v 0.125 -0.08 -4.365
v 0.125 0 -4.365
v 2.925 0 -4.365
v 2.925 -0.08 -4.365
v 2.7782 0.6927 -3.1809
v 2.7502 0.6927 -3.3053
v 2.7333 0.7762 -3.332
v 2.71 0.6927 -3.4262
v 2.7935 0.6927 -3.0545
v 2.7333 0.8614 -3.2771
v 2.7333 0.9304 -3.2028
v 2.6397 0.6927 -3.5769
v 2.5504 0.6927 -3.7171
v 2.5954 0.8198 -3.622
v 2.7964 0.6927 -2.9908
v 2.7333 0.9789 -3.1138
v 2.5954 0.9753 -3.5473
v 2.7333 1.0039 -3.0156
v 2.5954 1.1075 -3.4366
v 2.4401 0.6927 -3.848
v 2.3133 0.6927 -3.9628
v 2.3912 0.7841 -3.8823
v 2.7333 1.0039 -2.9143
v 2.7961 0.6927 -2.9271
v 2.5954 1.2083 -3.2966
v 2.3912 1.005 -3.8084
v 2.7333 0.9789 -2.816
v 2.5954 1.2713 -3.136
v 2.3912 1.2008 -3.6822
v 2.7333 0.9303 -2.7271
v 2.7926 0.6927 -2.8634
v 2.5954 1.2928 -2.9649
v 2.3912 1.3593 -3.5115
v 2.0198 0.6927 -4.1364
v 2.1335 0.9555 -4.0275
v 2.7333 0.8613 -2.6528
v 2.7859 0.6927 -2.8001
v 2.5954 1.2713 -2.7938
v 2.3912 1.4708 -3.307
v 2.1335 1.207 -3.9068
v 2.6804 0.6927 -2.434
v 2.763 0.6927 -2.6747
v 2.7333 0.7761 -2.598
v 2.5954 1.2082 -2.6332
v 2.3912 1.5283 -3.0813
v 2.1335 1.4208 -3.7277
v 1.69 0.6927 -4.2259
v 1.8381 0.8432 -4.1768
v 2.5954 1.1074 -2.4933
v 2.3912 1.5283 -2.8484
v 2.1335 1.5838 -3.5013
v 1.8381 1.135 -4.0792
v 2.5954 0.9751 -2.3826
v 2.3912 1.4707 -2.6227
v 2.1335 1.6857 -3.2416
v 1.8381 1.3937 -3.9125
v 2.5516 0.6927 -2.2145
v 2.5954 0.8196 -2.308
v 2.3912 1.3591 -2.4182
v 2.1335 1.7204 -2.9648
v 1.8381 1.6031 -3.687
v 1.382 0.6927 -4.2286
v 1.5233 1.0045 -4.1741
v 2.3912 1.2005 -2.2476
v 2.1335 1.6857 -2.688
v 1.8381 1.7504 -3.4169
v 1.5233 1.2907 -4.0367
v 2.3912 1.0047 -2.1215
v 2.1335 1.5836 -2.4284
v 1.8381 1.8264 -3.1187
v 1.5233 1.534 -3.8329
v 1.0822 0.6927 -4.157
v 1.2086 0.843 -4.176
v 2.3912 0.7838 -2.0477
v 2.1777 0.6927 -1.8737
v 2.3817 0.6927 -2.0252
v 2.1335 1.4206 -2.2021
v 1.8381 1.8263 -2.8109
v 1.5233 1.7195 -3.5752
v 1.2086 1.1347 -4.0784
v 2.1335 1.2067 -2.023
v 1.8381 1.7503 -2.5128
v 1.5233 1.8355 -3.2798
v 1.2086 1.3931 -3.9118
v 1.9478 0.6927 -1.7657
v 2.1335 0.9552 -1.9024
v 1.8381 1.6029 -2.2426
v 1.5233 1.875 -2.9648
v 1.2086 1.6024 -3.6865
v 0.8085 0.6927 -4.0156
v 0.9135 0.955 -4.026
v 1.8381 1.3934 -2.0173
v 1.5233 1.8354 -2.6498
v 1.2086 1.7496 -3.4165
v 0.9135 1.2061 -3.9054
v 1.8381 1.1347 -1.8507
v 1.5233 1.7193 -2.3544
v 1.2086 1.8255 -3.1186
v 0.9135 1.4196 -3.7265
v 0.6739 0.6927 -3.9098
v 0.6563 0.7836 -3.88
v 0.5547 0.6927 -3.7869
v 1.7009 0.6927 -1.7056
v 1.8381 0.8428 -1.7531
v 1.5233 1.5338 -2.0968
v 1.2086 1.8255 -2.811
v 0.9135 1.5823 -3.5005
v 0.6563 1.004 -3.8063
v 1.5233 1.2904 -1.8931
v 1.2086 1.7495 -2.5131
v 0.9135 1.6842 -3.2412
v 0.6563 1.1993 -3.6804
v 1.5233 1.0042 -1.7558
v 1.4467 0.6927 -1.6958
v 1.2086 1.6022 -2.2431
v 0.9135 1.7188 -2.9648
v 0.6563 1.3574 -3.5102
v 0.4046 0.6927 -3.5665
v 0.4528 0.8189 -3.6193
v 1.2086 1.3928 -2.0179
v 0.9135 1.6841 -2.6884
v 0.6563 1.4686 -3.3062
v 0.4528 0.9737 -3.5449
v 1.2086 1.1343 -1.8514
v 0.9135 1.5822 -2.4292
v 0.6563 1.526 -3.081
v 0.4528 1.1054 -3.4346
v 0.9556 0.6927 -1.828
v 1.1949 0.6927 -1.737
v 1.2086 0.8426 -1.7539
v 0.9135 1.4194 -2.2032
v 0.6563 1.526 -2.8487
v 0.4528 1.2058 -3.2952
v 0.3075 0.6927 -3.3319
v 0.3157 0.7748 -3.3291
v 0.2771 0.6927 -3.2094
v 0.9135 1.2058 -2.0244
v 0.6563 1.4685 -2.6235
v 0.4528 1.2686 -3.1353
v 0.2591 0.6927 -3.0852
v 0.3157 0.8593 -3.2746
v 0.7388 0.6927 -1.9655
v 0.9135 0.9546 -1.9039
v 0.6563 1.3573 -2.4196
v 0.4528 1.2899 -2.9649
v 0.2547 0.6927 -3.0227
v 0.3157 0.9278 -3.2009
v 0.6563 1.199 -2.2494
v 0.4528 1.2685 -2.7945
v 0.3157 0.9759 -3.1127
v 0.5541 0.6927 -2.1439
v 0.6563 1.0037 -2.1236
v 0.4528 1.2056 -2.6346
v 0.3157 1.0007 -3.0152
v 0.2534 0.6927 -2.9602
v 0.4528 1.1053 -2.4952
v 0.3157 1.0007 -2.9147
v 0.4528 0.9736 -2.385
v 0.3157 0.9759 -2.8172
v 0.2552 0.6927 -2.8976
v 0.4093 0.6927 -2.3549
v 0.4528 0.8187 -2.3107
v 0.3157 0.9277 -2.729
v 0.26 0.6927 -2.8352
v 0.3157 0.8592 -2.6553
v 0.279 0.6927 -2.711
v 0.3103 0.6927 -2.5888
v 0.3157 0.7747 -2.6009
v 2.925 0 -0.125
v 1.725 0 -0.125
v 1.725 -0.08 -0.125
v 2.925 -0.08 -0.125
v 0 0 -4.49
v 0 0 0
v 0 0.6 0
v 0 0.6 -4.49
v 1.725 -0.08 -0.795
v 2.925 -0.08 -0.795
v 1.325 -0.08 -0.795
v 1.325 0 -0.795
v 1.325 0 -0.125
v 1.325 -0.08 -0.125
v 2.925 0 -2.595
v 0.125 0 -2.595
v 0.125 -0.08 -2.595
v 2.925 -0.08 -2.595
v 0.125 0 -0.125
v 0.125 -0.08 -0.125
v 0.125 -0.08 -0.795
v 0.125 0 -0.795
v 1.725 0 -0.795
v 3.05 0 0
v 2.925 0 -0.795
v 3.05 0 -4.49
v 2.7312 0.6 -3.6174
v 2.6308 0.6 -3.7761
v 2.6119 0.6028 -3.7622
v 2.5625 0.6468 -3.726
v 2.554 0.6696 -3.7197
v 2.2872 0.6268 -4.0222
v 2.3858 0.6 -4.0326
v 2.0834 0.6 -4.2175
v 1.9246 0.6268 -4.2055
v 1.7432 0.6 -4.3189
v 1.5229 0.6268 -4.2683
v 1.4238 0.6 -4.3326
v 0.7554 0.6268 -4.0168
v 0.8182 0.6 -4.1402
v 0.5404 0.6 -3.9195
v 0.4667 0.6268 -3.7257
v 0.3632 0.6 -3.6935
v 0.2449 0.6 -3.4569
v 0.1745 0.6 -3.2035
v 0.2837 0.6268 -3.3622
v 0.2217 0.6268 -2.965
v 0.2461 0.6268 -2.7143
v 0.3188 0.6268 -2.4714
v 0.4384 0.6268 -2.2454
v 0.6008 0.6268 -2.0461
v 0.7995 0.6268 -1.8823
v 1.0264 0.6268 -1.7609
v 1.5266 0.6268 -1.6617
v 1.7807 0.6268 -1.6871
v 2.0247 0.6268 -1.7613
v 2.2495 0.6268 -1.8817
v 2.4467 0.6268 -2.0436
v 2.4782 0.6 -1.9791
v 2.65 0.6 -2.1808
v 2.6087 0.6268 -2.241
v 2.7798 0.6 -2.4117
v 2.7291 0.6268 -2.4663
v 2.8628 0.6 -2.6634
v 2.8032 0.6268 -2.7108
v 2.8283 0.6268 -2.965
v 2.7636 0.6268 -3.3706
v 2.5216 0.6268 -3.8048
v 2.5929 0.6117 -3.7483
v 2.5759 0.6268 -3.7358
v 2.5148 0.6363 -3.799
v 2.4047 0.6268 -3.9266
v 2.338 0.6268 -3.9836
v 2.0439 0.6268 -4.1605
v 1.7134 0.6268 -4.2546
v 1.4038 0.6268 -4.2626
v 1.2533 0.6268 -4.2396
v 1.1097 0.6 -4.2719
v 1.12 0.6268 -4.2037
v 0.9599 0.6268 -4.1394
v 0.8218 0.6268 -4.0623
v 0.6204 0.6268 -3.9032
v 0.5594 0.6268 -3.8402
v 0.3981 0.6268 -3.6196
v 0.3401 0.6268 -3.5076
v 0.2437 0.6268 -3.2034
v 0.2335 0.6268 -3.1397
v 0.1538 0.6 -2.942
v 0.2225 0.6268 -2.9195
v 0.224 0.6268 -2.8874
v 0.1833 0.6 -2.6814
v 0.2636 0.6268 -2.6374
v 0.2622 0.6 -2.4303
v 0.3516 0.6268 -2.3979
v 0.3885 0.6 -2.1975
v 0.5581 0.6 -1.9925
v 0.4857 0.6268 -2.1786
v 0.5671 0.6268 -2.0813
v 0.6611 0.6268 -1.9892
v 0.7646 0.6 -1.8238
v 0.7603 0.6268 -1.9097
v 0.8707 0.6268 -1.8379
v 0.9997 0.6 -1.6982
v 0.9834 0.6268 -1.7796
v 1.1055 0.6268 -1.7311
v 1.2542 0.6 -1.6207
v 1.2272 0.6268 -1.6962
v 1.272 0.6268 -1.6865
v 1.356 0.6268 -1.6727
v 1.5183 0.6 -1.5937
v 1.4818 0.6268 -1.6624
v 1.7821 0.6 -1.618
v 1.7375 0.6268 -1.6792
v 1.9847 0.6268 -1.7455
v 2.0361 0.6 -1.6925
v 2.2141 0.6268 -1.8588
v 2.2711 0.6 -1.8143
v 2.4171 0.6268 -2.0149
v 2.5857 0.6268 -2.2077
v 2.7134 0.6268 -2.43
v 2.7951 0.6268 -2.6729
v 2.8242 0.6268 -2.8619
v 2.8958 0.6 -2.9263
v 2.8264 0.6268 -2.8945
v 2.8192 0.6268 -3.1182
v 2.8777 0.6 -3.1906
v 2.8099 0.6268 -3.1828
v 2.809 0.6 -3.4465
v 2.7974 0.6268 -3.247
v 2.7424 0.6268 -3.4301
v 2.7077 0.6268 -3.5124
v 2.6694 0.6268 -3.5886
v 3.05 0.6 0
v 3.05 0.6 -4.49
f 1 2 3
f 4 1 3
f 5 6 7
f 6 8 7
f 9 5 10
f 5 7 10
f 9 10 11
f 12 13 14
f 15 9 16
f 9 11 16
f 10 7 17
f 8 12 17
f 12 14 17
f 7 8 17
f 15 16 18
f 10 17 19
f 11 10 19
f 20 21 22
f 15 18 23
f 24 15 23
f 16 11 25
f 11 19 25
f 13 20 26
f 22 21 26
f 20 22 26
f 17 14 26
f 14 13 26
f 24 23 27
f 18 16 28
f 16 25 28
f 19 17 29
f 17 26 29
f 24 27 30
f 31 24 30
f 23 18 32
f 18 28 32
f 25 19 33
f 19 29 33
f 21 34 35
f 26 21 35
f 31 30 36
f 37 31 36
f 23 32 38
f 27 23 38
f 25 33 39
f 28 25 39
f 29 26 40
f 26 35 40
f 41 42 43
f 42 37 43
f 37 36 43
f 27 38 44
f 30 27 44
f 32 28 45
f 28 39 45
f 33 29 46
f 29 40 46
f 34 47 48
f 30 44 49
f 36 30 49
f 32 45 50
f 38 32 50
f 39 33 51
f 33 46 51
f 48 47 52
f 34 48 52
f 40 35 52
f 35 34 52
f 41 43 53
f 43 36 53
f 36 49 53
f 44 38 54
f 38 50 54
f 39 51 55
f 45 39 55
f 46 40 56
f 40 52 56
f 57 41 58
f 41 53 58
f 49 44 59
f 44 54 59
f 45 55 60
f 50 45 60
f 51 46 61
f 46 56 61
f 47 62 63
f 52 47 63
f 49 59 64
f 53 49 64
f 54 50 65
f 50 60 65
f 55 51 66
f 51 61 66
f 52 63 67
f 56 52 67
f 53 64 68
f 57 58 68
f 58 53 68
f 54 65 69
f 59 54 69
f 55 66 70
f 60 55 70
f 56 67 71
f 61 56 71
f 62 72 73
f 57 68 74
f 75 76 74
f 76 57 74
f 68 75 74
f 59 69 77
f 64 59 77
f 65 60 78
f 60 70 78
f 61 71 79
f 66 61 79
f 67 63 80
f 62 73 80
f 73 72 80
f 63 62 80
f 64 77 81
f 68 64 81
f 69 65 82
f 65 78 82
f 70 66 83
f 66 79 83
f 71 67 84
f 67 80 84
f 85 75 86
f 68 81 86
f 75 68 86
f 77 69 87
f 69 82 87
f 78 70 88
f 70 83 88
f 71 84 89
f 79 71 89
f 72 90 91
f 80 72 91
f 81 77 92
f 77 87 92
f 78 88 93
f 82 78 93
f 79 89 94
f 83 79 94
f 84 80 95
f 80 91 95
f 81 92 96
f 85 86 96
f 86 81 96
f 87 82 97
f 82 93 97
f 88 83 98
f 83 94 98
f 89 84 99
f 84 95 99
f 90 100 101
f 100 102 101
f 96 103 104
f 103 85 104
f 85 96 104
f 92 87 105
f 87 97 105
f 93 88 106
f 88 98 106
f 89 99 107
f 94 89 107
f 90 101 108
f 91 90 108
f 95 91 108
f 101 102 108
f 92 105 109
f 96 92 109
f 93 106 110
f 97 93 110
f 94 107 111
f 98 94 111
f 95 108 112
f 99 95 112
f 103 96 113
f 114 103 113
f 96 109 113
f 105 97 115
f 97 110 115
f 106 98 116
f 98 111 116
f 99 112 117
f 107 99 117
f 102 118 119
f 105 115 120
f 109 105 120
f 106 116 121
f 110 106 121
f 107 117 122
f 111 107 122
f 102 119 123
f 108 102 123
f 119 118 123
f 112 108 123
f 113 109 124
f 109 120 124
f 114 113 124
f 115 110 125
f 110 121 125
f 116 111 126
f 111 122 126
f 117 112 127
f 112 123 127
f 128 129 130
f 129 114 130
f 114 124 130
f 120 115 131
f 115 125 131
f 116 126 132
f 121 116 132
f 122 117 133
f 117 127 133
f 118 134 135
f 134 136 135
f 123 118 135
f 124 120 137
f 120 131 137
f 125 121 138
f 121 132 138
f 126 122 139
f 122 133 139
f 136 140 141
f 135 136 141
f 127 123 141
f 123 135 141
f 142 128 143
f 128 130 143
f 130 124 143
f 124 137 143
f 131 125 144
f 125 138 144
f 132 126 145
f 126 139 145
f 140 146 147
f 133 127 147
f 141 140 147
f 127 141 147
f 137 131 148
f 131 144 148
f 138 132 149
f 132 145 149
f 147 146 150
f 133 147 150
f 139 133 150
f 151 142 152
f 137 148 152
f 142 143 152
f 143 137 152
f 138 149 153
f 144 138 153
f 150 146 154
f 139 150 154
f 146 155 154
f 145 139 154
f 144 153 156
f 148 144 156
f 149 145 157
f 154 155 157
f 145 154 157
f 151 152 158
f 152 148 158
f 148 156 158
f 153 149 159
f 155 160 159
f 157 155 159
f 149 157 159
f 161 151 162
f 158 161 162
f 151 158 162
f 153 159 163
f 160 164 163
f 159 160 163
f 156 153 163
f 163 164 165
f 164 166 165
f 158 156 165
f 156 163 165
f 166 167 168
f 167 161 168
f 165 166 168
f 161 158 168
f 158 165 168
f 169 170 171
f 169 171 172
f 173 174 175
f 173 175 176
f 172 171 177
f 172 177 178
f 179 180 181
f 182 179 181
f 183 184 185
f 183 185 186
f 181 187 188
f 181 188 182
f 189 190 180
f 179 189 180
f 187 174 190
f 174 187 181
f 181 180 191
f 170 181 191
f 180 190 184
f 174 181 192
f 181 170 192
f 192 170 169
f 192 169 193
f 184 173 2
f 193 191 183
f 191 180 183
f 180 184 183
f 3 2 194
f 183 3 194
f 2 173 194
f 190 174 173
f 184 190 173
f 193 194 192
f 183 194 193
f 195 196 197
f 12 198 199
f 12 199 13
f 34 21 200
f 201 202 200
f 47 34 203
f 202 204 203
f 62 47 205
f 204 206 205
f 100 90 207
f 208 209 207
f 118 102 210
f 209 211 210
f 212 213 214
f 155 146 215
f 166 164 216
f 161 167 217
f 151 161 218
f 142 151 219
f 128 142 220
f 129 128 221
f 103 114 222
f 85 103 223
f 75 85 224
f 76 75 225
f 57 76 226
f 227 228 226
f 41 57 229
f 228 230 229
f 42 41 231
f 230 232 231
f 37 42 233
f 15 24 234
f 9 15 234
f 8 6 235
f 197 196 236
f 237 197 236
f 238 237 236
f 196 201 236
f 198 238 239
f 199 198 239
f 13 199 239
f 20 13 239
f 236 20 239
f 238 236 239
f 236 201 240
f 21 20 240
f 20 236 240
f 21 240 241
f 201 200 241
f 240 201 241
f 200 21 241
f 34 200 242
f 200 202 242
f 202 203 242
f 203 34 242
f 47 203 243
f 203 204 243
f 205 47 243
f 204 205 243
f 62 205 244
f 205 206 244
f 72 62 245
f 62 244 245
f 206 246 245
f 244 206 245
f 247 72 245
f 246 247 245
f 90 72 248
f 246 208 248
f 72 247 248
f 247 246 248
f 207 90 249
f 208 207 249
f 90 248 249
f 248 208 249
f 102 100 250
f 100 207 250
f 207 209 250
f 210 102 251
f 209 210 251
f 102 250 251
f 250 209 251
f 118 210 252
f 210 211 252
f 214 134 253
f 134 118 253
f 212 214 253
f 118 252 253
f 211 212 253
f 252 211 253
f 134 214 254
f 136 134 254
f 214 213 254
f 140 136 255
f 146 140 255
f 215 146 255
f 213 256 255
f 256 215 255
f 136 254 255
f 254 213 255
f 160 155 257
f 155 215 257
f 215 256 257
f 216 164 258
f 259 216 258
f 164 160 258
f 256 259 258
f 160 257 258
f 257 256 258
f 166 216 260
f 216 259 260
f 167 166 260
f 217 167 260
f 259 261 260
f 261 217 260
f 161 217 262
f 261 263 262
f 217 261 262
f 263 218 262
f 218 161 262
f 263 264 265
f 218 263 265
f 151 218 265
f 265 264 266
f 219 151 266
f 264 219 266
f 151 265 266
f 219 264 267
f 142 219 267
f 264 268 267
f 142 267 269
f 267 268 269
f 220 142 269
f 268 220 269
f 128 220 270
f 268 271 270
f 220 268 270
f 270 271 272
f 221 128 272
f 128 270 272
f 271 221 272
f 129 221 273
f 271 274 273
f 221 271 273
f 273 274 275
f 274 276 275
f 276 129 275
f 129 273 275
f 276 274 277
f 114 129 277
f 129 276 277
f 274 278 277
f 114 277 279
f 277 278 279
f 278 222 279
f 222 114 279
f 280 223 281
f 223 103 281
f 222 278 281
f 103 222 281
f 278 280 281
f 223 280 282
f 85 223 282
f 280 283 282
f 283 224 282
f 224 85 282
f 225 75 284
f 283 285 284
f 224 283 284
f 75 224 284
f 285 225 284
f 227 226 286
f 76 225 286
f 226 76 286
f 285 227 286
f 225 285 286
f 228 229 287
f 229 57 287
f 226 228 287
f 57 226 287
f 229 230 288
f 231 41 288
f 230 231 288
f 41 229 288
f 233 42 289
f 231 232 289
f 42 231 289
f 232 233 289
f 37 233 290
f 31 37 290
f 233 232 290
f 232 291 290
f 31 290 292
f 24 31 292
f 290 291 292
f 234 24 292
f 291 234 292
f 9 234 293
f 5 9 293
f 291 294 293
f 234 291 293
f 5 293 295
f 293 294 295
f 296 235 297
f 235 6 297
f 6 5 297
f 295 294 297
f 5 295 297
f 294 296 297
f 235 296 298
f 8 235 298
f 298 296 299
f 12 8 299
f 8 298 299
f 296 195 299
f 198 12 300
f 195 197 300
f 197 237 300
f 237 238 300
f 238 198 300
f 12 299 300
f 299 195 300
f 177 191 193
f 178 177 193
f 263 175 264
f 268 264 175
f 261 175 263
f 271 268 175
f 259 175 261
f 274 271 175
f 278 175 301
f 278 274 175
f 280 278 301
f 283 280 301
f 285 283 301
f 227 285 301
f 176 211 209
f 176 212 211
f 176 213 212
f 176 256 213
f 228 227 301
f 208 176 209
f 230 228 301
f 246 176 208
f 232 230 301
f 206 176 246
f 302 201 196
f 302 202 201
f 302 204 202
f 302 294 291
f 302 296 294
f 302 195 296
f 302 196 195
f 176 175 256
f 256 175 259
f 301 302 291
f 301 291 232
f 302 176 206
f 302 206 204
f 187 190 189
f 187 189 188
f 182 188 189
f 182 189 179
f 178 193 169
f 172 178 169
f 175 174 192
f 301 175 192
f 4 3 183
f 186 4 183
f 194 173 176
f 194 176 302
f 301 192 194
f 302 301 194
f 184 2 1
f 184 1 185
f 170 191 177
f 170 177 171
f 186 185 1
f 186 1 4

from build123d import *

# Parameters (mm, degrees)
SKETCH1_W           = 3.05
SKETCH1_H           = 4.49
BOSS_EXTRUDE1_DEPTH = 0.6
REVOLVE1_ANGLE      = 180
FILLET1_R           = 0.1
SKETCH3_W           = 2.8
SKETCH3_H           = 1.77
SKETCH3_W_2         = 1.2
SKETCH3_H_2         = 0.67
BOSS_EXTRUDE2_DEPTH = 0.08


with BuildPart() as part:
    # Sketch1 → Boss-Extrude1 (new body)
    with BuildSketch(Plane(origin=(0, 0, 0), x_dir=(1, 0, 0), z_dir=(0, 1, 0))):
        with Locations((1.525, 2.245)):
            Rectangle(SKETCH1_W, SKETCH1_H)
    extrude(amount=BOSS_EXTRUDE1_DEPTH)

    # Sketch2 → Revolve1 (revolve)
    with BuildSketch(Plane(origin=(0, 0.6, 0), x_dir=(1, 0, 0), z_dir=(0, 1, 0))):
        with BuildLine():
            Line((0.25, 2.965), (2.8, 2.965))
            ThreePointArc((2.8, 2.965), (1.525, 4.24), (0.25, 2.965))
        make_face()
    revolve(axis=Axis((0.25, 0.6, -2.965), (1, 0, 0)), revolution_arc=REVOLVE1_ANGLE)

    # Fillet1
    fillet1_edges = [part.edges().sort_by_distance(p)[0] for p in [
        (1.525, 0.6, -4.24),
    ]]
    fillet(fillet1_edges, radius=FILLET1_R)

    # Sketch3 → Boss-Extrude2 (add)
    with BuildSketch(Plane.XZ):
        with Locations((1.525, -3.48)):
            Rectangle(SKETCH3_W, SKETCH3_H)
        with Locations((0.725, -0.46)):
            Rectangle(SKETCH3_W_2, SKETCH3_H_2)
        with Locations((2.325, -0.46)):
            Rectangle(SKETCH3_W_2, SKETCH3_H_2)
    extrude(amount=BOSS_EXTRUDE2_DEPTH)


solid = part.part
